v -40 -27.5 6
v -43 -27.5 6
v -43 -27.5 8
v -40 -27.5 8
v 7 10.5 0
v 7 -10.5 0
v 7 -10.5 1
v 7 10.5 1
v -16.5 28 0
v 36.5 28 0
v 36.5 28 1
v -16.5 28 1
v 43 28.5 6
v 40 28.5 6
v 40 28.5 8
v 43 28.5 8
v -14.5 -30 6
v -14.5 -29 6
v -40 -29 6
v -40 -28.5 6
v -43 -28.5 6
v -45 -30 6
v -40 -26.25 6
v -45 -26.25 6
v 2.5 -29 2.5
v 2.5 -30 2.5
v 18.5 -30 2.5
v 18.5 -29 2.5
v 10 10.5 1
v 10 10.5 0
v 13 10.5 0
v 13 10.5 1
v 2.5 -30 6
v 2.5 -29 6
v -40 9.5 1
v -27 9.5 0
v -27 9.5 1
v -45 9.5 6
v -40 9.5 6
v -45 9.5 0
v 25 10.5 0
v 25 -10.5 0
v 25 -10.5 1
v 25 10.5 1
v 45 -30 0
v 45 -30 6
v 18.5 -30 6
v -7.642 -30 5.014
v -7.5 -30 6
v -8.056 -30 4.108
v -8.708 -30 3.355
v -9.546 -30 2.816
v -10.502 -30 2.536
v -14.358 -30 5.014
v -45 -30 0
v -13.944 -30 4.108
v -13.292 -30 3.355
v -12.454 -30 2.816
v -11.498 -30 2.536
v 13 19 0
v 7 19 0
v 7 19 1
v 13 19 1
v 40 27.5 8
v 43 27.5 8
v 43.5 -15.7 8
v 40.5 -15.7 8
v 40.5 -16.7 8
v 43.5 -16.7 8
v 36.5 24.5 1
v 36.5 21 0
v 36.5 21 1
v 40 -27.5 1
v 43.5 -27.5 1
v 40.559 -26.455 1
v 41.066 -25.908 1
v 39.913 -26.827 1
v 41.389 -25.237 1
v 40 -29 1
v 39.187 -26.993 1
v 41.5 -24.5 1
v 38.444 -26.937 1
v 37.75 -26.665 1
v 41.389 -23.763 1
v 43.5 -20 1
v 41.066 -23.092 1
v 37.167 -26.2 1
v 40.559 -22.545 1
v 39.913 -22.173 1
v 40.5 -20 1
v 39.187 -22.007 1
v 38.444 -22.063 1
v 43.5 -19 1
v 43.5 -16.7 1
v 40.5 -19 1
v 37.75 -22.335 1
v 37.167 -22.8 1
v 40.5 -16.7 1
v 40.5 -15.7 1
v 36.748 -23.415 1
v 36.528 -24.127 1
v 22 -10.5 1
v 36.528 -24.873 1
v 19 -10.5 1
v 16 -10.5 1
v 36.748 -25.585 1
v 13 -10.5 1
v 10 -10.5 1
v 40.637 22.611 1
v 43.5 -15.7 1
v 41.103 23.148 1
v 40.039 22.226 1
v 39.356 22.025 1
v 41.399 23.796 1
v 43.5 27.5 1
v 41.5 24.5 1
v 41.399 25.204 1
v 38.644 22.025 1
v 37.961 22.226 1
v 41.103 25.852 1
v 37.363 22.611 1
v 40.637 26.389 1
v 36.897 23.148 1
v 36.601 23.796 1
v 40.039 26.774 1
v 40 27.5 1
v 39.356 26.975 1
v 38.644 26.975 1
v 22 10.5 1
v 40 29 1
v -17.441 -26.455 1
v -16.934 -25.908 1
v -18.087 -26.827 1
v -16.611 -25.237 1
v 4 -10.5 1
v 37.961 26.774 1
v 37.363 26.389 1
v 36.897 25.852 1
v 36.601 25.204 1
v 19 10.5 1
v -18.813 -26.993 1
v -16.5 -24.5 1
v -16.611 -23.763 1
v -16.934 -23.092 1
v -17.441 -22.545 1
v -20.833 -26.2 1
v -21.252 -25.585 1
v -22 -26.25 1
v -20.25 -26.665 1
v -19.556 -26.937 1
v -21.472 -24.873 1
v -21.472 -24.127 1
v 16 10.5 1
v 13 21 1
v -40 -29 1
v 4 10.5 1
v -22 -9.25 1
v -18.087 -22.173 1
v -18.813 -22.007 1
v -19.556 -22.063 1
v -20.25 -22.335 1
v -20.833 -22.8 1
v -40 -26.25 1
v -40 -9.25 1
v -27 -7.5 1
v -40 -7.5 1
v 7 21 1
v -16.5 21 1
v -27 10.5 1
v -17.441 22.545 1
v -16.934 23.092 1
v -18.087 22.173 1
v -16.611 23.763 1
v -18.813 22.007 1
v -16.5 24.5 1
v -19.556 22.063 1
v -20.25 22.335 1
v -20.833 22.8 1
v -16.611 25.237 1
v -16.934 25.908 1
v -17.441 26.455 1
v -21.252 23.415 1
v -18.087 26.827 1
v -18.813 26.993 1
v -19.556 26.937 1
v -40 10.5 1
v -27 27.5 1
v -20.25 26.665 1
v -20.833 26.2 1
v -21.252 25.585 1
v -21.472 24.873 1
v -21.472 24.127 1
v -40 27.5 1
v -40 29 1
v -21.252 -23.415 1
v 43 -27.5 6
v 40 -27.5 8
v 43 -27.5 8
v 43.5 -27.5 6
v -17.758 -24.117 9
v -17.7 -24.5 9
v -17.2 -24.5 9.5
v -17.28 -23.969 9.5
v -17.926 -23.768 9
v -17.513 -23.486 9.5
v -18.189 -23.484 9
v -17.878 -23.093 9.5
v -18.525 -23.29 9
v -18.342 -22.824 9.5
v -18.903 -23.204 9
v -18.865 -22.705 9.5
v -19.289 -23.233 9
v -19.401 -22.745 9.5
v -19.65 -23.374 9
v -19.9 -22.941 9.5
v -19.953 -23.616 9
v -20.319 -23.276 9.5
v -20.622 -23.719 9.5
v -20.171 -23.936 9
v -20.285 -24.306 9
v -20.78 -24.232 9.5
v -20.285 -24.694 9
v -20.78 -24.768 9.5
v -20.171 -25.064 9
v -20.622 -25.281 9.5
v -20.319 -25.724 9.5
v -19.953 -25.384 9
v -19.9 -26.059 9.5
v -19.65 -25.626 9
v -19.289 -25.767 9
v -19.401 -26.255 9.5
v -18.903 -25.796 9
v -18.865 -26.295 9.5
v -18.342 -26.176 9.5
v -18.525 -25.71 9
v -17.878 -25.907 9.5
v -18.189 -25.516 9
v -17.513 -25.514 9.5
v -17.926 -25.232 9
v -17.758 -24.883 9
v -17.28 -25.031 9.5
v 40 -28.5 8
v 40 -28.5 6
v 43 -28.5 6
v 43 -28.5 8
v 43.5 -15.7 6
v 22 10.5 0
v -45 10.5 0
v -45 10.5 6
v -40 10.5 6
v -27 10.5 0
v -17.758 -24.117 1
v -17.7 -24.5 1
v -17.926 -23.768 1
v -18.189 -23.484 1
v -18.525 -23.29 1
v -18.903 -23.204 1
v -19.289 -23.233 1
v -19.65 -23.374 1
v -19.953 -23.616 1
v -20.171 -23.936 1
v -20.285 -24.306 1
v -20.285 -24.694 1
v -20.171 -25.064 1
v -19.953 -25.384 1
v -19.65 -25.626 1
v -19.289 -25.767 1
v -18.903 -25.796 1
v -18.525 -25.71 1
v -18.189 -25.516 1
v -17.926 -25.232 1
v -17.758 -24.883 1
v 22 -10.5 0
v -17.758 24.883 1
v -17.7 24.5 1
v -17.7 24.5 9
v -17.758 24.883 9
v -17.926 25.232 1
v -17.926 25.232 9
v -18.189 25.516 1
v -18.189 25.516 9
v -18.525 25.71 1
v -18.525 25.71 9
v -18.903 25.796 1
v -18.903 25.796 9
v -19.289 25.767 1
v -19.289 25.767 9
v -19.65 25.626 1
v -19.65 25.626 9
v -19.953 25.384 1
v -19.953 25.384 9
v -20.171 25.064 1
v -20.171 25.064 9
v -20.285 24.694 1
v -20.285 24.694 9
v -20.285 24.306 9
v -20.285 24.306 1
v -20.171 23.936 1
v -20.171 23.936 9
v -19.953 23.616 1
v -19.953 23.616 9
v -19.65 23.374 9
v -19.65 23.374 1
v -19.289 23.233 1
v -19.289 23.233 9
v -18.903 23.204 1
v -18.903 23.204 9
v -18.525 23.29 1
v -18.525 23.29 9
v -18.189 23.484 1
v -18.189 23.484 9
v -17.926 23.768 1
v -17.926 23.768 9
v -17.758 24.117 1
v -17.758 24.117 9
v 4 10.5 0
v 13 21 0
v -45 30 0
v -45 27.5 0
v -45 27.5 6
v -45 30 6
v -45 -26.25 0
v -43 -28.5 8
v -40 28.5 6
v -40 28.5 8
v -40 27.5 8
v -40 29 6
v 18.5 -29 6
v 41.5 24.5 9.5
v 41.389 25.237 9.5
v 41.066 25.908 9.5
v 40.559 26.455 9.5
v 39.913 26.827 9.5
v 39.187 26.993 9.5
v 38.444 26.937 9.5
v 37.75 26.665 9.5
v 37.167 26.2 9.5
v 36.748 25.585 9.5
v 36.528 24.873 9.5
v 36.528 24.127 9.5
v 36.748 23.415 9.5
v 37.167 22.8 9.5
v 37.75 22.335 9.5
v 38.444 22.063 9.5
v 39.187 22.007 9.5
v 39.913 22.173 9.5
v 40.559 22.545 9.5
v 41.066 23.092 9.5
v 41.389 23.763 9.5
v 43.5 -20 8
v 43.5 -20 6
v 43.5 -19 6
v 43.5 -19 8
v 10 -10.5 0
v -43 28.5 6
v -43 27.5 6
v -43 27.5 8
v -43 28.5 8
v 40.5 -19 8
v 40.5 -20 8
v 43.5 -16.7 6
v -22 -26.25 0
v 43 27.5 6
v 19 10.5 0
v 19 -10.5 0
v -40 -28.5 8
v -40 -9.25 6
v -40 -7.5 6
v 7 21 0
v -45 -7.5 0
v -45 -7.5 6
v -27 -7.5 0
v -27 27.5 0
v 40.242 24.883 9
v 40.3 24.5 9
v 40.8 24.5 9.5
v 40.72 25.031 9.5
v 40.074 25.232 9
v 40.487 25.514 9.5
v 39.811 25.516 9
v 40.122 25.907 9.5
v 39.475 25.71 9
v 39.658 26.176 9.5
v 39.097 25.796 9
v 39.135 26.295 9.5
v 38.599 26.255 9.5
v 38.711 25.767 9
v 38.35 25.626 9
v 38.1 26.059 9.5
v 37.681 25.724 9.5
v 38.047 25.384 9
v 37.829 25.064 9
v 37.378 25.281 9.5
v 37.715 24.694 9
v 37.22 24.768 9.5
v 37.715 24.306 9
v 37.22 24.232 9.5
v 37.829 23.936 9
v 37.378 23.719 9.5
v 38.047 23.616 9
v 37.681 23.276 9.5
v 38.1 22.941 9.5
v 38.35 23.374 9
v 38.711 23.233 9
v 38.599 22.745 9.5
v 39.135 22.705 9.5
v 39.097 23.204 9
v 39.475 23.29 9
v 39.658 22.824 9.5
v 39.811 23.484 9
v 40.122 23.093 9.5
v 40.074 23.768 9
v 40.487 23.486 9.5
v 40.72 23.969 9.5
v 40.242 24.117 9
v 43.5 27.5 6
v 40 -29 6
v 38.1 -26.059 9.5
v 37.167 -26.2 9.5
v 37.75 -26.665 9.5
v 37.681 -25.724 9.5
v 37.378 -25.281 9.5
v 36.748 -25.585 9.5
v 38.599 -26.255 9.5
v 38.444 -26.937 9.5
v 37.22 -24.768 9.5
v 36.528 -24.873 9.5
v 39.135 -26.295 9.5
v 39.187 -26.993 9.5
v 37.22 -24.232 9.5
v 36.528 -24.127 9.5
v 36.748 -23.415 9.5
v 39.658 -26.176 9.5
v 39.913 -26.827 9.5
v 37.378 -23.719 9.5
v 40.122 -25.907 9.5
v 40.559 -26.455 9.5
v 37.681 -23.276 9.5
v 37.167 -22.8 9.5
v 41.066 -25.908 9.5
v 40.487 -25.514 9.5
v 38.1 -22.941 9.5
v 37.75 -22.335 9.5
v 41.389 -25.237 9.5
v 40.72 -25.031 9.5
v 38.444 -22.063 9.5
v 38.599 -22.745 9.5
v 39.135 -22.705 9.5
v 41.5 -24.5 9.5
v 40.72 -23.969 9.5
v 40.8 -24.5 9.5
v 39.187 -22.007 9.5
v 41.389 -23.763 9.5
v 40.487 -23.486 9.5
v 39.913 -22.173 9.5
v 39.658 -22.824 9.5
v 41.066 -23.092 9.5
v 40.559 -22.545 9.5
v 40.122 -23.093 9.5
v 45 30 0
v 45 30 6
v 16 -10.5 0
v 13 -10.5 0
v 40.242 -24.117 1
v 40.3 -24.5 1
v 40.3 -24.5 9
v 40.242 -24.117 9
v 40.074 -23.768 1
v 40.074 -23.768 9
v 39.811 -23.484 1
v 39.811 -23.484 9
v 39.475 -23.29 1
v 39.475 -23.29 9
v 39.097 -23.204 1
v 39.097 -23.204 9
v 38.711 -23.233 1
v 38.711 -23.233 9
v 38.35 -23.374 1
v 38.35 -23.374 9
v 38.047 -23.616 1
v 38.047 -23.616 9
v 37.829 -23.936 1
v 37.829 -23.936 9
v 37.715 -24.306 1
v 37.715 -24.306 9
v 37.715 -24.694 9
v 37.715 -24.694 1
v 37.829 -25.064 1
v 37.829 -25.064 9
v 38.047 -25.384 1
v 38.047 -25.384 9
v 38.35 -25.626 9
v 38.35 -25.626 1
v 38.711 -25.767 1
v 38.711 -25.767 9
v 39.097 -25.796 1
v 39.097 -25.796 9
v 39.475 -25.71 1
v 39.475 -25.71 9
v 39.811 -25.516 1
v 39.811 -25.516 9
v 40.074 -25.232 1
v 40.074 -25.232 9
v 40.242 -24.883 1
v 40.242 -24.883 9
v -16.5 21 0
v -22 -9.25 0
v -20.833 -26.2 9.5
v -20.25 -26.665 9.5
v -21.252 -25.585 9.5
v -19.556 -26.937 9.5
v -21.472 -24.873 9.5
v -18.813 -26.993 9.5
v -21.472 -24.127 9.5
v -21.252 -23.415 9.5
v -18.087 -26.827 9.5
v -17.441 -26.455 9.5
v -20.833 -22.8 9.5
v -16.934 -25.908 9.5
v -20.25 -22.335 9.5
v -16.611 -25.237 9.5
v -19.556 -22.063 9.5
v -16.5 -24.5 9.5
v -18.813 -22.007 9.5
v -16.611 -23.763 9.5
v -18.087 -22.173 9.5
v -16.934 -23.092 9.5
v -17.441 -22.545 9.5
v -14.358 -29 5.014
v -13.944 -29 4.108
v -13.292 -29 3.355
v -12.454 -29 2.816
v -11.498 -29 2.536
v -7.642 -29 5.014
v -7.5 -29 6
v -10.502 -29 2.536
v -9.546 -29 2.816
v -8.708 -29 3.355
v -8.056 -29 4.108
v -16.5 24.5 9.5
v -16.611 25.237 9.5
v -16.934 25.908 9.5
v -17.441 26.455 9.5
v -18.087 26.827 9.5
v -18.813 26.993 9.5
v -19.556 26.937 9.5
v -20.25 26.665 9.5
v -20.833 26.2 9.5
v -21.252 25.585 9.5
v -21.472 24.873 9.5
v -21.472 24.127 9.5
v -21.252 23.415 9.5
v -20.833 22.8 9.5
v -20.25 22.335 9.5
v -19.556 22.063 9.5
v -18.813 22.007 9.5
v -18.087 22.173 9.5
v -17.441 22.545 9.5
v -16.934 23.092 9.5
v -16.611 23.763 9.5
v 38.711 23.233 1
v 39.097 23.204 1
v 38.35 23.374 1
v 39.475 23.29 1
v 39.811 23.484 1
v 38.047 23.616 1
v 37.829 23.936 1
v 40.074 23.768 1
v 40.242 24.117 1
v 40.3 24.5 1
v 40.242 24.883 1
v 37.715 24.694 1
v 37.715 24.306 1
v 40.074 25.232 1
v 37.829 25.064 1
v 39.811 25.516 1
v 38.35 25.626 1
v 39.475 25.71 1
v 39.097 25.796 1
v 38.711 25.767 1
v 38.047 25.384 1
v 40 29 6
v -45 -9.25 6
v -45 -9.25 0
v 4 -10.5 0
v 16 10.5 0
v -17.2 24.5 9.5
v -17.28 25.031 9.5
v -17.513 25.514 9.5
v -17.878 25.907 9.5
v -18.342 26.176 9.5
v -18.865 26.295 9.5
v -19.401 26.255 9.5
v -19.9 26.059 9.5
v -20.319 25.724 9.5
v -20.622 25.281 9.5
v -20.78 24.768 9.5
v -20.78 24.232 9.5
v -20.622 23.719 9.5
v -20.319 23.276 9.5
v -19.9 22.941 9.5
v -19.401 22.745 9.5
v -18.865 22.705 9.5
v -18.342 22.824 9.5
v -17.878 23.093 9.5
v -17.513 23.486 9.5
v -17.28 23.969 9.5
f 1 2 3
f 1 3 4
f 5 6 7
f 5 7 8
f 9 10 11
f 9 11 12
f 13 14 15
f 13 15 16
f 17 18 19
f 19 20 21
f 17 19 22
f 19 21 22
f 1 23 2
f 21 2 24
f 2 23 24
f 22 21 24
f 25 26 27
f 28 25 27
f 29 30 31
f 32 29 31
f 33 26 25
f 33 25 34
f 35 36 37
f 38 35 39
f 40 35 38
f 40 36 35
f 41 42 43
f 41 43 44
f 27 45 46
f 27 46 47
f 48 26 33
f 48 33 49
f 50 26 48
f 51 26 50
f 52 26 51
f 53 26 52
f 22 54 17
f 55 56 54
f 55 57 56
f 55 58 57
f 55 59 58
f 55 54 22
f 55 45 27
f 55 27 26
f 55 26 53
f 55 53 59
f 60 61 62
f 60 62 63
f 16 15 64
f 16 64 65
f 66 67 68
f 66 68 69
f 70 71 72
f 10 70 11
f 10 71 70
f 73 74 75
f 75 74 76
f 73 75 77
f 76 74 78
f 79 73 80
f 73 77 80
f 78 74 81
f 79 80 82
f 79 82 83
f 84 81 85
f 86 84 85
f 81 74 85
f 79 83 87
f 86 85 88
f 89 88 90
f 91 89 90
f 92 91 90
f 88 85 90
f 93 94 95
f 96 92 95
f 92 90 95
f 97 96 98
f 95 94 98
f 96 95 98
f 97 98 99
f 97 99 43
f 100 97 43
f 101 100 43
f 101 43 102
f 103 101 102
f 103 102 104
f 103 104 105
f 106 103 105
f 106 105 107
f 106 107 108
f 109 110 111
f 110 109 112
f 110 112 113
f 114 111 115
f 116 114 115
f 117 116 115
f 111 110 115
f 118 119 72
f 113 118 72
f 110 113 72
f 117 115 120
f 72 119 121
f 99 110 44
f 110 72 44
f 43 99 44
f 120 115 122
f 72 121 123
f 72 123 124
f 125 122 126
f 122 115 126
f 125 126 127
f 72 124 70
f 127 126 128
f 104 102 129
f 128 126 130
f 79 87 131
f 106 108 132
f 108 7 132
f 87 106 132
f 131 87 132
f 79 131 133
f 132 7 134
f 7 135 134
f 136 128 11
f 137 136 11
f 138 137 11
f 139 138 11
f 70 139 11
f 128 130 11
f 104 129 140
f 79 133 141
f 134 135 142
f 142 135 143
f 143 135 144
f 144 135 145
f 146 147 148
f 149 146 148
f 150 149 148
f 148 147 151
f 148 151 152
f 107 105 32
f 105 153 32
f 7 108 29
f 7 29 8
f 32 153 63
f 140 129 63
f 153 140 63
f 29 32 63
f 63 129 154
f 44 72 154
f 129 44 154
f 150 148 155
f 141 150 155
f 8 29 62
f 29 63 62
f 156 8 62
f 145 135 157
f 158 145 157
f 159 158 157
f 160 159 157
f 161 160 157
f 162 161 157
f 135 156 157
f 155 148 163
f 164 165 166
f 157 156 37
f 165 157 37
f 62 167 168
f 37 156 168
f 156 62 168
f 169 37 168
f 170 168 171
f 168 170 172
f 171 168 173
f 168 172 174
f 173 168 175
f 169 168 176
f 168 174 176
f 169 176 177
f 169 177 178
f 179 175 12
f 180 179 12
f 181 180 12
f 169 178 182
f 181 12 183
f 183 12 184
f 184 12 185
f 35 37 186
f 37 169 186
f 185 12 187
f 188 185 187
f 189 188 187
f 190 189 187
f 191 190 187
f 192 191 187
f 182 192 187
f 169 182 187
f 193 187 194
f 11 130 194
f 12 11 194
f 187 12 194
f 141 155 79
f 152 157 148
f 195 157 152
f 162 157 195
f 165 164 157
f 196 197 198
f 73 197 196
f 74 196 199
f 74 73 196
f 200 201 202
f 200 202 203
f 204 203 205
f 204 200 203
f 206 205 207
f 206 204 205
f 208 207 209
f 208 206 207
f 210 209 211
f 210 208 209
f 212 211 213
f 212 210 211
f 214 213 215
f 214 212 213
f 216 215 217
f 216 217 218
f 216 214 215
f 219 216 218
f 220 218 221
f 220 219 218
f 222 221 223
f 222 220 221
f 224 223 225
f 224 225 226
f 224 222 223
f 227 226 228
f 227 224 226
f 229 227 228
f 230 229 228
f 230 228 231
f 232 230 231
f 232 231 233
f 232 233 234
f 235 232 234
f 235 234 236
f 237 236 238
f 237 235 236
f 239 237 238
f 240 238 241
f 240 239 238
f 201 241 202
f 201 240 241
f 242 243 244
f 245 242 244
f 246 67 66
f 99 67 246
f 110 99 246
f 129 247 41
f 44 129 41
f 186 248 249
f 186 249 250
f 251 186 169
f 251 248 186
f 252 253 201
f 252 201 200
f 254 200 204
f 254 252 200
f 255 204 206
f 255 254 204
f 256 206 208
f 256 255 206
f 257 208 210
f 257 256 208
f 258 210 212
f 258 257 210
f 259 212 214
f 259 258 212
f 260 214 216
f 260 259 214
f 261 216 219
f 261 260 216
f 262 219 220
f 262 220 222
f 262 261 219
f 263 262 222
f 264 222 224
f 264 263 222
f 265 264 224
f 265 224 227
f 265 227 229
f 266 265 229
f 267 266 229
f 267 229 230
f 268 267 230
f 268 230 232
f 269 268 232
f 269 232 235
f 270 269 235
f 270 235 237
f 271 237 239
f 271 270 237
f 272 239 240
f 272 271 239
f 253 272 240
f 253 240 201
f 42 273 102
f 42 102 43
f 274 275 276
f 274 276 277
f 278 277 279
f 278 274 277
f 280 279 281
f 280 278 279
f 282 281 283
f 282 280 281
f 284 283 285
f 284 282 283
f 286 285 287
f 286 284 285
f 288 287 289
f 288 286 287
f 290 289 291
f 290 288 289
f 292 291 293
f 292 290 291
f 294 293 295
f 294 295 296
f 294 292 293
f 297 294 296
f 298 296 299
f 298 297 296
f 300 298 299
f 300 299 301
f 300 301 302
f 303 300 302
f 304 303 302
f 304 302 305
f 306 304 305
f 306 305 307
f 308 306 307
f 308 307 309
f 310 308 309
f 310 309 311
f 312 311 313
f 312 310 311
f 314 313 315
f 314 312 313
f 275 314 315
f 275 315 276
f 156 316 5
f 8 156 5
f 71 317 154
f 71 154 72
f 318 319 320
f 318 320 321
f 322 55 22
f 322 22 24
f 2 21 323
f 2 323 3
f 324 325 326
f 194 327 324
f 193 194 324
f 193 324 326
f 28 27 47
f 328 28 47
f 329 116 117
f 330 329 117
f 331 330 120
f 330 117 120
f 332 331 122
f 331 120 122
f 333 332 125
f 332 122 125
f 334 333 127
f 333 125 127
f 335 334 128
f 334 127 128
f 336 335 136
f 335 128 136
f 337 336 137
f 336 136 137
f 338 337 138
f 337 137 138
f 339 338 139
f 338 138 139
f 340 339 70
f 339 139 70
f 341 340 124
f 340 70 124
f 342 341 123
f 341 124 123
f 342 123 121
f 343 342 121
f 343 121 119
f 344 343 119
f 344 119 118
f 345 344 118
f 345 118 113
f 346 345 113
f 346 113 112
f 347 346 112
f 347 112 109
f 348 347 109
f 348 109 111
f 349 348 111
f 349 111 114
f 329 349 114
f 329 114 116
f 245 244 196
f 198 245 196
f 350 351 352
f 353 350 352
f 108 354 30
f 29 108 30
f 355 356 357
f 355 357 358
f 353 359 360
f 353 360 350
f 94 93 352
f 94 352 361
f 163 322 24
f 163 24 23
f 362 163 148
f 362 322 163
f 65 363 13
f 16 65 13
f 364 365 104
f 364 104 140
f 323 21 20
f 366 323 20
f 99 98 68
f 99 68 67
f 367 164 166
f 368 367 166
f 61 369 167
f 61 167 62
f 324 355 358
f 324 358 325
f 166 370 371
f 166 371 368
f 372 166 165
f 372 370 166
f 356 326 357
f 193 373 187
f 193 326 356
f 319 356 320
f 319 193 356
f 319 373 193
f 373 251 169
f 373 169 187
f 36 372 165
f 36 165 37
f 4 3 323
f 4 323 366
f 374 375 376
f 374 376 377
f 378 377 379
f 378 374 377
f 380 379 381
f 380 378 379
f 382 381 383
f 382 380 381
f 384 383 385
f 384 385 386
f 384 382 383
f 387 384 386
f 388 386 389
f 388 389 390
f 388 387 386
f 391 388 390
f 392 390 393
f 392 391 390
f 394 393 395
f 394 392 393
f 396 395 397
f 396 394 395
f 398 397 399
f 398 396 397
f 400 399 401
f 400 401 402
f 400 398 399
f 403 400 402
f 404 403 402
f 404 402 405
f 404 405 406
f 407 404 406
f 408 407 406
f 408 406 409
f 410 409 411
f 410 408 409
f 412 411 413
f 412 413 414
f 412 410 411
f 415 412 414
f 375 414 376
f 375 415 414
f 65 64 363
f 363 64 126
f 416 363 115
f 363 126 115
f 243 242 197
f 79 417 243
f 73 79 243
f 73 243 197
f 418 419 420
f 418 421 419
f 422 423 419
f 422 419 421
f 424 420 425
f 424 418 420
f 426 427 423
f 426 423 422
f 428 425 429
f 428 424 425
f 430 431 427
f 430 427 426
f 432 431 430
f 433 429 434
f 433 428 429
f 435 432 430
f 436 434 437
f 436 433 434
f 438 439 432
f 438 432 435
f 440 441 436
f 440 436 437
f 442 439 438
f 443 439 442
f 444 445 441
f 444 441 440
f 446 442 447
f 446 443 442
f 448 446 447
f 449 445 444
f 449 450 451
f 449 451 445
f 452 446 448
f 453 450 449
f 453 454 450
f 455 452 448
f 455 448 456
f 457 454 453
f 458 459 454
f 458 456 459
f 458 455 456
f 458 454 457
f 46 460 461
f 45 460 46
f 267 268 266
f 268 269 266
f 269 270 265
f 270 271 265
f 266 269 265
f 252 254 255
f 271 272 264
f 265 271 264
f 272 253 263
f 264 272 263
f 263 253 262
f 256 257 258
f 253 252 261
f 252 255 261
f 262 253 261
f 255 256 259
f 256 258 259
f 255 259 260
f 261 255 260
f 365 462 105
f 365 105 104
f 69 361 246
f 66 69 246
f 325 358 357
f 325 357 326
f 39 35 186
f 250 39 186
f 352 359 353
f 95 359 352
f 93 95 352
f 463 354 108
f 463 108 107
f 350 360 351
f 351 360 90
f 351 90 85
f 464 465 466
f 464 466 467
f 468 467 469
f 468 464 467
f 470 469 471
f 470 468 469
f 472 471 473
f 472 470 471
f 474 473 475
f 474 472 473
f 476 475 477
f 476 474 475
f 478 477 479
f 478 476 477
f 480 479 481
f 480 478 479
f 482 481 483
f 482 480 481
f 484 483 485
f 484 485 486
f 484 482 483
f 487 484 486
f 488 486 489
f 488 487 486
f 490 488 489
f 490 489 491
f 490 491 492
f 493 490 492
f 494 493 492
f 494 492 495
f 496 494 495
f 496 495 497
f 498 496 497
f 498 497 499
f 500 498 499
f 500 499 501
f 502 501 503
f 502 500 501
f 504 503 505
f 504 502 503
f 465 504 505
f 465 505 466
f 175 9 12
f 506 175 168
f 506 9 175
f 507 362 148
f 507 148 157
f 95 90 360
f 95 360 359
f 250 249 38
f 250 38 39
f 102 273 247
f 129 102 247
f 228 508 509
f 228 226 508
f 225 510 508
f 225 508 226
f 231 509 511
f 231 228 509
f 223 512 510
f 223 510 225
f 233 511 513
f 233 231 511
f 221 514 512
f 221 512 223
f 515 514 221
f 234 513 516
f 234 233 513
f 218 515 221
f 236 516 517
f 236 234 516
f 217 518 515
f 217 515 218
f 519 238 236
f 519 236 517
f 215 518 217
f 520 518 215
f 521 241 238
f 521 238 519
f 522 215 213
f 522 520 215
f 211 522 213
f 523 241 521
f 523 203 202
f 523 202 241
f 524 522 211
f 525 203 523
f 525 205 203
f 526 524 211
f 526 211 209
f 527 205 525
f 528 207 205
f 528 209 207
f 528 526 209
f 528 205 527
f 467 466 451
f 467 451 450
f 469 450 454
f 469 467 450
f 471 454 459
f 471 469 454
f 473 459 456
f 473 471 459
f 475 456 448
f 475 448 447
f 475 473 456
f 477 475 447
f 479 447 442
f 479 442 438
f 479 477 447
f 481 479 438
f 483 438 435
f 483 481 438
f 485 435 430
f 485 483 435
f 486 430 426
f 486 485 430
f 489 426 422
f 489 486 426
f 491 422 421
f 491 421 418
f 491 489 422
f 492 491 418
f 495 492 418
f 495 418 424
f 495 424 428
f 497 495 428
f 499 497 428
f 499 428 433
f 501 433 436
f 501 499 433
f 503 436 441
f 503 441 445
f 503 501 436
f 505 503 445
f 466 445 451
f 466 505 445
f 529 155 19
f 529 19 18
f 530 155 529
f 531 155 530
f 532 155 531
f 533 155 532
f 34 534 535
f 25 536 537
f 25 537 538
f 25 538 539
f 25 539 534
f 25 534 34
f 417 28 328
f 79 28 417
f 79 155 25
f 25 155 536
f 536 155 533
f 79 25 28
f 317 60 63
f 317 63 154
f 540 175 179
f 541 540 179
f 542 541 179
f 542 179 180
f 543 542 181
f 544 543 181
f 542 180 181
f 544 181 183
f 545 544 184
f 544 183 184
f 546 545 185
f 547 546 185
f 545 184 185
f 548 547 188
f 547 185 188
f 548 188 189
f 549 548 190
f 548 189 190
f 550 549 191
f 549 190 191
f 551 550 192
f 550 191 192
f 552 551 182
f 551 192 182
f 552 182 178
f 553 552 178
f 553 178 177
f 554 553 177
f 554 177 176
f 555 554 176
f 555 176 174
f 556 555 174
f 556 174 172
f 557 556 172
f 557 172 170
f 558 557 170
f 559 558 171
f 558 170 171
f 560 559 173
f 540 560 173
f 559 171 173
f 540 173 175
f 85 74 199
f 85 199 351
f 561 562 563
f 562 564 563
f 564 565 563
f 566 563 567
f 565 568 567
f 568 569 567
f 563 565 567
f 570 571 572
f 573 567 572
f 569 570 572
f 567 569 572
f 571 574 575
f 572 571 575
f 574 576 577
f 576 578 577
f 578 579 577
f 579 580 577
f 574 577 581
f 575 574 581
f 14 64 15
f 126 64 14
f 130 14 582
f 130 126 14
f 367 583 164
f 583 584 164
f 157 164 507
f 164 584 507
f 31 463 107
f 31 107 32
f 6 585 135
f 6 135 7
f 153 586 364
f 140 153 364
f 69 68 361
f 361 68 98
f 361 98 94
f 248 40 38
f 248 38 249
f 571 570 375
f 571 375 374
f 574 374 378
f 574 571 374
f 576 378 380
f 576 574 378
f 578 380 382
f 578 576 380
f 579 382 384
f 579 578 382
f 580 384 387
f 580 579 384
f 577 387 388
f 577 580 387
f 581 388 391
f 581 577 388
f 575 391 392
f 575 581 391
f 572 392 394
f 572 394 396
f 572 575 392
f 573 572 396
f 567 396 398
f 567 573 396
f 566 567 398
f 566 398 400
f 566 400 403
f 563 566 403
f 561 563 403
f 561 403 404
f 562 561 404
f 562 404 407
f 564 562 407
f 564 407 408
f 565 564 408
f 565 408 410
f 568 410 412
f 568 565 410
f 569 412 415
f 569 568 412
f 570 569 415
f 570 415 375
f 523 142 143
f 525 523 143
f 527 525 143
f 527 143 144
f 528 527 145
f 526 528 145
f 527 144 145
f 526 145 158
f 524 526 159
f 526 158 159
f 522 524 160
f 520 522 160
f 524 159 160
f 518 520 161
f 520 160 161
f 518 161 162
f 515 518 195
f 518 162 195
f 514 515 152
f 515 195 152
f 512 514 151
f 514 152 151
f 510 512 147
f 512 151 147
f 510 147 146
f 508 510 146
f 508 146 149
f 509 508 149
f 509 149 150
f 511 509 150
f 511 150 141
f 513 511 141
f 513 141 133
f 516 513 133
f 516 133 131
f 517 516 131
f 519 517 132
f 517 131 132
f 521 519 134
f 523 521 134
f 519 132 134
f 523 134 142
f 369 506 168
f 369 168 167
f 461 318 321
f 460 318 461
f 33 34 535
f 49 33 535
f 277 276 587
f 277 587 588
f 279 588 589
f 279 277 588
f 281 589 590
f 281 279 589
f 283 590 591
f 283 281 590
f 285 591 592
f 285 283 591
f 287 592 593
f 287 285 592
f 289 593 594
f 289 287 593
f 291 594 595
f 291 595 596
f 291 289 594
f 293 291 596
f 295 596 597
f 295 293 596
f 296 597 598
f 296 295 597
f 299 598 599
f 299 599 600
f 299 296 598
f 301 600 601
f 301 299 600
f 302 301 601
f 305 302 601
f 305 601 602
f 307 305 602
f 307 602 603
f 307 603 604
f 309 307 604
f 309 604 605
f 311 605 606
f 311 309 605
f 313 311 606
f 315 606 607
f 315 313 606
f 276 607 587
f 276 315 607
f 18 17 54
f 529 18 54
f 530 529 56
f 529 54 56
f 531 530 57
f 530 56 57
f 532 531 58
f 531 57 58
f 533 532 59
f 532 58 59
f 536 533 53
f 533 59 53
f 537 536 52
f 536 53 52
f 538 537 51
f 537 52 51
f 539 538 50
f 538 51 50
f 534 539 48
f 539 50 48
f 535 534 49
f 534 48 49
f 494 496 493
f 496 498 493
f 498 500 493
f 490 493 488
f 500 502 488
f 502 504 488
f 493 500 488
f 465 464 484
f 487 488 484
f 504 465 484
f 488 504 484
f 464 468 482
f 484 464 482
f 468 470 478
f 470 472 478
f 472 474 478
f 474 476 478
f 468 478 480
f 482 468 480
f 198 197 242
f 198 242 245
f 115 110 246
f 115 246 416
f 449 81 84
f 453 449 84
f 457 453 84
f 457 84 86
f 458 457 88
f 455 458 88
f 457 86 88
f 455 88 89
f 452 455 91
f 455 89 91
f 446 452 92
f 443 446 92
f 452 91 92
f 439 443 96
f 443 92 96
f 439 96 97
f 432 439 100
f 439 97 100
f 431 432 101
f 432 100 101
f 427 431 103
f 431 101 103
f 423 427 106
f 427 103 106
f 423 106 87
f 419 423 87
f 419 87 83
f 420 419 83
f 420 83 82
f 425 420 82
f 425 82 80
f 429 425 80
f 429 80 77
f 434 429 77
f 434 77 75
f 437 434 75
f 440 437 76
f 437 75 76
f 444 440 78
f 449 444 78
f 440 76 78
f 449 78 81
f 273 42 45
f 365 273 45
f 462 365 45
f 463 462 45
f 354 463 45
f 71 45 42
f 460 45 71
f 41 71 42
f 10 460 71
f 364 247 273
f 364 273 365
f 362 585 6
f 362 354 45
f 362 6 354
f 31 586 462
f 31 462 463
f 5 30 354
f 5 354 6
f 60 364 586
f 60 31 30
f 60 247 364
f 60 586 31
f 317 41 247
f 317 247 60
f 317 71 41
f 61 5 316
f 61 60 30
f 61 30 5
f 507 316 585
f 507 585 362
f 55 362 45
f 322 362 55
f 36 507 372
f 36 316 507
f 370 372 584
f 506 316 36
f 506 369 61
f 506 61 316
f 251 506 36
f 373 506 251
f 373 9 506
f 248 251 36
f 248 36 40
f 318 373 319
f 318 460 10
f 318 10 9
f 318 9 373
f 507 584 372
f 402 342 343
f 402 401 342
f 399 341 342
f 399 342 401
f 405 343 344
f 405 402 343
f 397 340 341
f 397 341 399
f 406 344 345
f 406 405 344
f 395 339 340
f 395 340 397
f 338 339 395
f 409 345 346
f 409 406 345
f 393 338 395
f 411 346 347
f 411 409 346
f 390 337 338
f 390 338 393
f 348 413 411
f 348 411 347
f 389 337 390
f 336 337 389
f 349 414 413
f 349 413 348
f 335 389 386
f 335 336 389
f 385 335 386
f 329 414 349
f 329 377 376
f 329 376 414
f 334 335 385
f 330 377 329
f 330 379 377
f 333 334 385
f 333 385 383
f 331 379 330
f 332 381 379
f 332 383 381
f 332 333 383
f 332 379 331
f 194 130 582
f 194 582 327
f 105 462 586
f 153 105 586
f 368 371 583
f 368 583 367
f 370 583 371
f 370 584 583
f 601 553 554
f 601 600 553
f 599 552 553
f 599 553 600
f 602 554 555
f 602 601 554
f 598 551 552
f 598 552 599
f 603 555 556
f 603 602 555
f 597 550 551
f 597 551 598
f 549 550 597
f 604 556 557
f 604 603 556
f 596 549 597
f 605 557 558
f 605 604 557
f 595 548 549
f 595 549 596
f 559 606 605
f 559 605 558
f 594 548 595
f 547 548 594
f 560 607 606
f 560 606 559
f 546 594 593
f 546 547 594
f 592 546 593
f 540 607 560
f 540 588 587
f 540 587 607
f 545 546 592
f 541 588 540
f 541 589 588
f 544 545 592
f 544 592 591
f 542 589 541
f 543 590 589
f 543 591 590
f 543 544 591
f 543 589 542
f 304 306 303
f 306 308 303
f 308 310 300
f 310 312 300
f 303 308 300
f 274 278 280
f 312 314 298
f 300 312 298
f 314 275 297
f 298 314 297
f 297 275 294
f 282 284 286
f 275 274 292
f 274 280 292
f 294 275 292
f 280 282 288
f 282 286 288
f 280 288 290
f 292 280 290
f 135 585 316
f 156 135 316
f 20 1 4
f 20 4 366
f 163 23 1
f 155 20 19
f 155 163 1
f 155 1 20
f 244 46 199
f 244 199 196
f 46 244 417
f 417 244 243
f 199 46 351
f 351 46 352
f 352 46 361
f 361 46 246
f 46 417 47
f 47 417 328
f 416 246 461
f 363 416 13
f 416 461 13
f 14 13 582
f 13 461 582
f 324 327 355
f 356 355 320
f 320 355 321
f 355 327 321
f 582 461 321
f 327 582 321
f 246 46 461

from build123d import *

# Parameters (mm, degrees)
SKETCH_W      = 3
SKETCH_H      = 21
PAD_DEPTH     = 1
SKETCH001_W   = 5
SKETCH001_H   = 1.75
SKETCH001_H_2 = 1
PAD001_DEPTH  = 5
SKETCH002_W   = 3
SKETCH002_H   = 1
PAD002_DEPTH  = 2
SKETCH003_R   = 2.5
SKETCH003_R_2 = 1.3
PAD003_DEPTH  = 8.5
SKETCH004_W   = 16
SKETCH004_H   = 3.5
POCKET_DEPTH  = 1
CHAMFER_SIZE  = 0.5
SKETCH005_W   = 3
SKETCH005_H   = 1
PAD004_DEPTH  = 7


with BuildPart() as part:
    # Sketch → Pad (new body)
    with BuildSketch(Plane.XY):
        Polygon((-45, 30), (45, 30), (45, -30), (-45, -30), (-45, -26.25), (-22, -26.25), (-22, -9.25), (-45, -9.25), (-45, -7.5), (-27, -7.5), (-27, 9.5), (-45, 9.5), (-45, 10.5), (-27, 10.5), (-27, 27.5), (-45, 27.5), align=None)
        Polygon((36.5, 21), (36.5, 28), (-16.5, 28), (-16.5, 21), (7, 21), (7, 19), (13, 19), (13, 21), align=None, mode=Mode.SUBTRACT)
        with Locations((5.5, 0)):
            Rectangle(SKETCH_W, SKETCH_H, mode=Mode.SUBTRACT)
        with Locations((11.5, 0)):
            Rectangle(SKETCH_W, SKETCH_H, mode=Mode.SUBTRACT)
        with Locations((17.5, 0)):
            Rectangle(SKETCH_W, SKETCH_H, mode=Mode.SUBTRACT)
        with Locations((23.5, 0)):
            Rectangle(SKETCH_W, SKETCH_H, mode=Mode.SUBTRACT)
    extrude(amount=PAD_DEPTH)

    # Sketch001 → Pad001 (new body)
    with BuildSketch(Plane.XY.offset(1)):
        with Locations((-42.5, -8.375)):
            Rectangle(SKETCH001_W, SKETCH001_H)
        with Locations((-42.5, 10)):
            Rectangle(SKETCH001_W, SKETCH001_H_2)
        Polygon((-45, 30), (45, 30), (45, -30), (-45, -30), (-45, -26.25), (-40, -26.25), (-40, -29), (40, -29), (40, -27.5), (43.5, -27.5), (43.5, 27.5), (40, 27.5), (40, 29), (-40, 29), (-40, 27.5), (-45, 27.5), align=None)
    extrude(amount=PAD001_DEPTH)

    # Sketch002 → Pad002 (new body)
    with BuildSketch(Plane.XY.offset(6)):
        with Locations((41.5, 28)):
            Rectangle(SKETCH002_W, SKETCH002_H)
        with Locations((-41.5, 28)):
            Rectangle(SKETCH002_W, SKETCH002_H)
        with Locations((-41.5, -28)):
            Rectangle(SKETCH002_W, SKETCH002_H)
        with Locations((41.5, -28)):
            Rectangle(SKETCH002_W, SKETCH002_H)
    extrude(amount=PAD002_DEPTH)

    # Sketch003 → Pad003 (new body)
    with BuildSketch(Plane.XY.offset(1)):
        with Locations((-19, 24.5)):
            Circle(SKETCH003_R)
        with Locations((-19, 24.5)):
            Circle(SKETCH003_R_2, mode=Mode.SUBTRACT)
        with Locations((39, 24.5)):
            Circle(SKETCH003_R)
        with Locations((39, 24.5)):
            Circle(SKETCH003_R_2, mode=Mode.SUBTRACT)
        with Locations((-19, -24.5)):
            Circle(SKETCH003_R)
        with Locations((-19, -24.5)):
            Circle(SKETCH003_R_2, mode=Mode.SUBTRACT)
        with Locations((39, -24.5)):
            Circle(SKETCH003_R)
        with Locations((39, -24.5)):
            Circle(SKETCH003_R_2, mode=Mode.SUBTRACT)
    extrude(amount=PAD003_DEPTH)

    # Sketch004 → Pocket (cut)
    with BuildSketch(Plane.XZ.offset(30)):
        with BuildLine():
            ThreePointArc((-14.5, 6), (-11, 2.5), (-7.5, 6))
            Line((-14.5, 6), (-7.5, 6))
        make_face()
        with Locations((10.5, 4.25)):
            Rectangle(SKETCH004_W, SKETCH004_H)
    extrude(amount=-POCKET_DEPTH, mode=Mode.SUBTRACT)

    # Chamfer
    chamfer_edges = [part.edges().sort_by_distance(p)[0] for p in [
        (-20.3, 24.5, 9.5),
        (37.7, 24.5, 9.5),
        (37.7, -24.5, 9.5),
        (-20.3, -24.5, 9.5),
    ]]
    chamfer(chamfer_edges, length=CHAMFER_SIZE)

    # Sketch005 → Pad004 (new body)
    with BuildSketch(Plane.XY.offset(1)):
        with Locations((42, -16.2)):
            Rectangle(SKETCH005_W, SKETCH005_H)
        with Locations((42, -19.5)):
            Rectangle(SKETCH005_W, SKETCH005_H)
    extrude(amount=PAD004_DEPTH)


solid = part.part
